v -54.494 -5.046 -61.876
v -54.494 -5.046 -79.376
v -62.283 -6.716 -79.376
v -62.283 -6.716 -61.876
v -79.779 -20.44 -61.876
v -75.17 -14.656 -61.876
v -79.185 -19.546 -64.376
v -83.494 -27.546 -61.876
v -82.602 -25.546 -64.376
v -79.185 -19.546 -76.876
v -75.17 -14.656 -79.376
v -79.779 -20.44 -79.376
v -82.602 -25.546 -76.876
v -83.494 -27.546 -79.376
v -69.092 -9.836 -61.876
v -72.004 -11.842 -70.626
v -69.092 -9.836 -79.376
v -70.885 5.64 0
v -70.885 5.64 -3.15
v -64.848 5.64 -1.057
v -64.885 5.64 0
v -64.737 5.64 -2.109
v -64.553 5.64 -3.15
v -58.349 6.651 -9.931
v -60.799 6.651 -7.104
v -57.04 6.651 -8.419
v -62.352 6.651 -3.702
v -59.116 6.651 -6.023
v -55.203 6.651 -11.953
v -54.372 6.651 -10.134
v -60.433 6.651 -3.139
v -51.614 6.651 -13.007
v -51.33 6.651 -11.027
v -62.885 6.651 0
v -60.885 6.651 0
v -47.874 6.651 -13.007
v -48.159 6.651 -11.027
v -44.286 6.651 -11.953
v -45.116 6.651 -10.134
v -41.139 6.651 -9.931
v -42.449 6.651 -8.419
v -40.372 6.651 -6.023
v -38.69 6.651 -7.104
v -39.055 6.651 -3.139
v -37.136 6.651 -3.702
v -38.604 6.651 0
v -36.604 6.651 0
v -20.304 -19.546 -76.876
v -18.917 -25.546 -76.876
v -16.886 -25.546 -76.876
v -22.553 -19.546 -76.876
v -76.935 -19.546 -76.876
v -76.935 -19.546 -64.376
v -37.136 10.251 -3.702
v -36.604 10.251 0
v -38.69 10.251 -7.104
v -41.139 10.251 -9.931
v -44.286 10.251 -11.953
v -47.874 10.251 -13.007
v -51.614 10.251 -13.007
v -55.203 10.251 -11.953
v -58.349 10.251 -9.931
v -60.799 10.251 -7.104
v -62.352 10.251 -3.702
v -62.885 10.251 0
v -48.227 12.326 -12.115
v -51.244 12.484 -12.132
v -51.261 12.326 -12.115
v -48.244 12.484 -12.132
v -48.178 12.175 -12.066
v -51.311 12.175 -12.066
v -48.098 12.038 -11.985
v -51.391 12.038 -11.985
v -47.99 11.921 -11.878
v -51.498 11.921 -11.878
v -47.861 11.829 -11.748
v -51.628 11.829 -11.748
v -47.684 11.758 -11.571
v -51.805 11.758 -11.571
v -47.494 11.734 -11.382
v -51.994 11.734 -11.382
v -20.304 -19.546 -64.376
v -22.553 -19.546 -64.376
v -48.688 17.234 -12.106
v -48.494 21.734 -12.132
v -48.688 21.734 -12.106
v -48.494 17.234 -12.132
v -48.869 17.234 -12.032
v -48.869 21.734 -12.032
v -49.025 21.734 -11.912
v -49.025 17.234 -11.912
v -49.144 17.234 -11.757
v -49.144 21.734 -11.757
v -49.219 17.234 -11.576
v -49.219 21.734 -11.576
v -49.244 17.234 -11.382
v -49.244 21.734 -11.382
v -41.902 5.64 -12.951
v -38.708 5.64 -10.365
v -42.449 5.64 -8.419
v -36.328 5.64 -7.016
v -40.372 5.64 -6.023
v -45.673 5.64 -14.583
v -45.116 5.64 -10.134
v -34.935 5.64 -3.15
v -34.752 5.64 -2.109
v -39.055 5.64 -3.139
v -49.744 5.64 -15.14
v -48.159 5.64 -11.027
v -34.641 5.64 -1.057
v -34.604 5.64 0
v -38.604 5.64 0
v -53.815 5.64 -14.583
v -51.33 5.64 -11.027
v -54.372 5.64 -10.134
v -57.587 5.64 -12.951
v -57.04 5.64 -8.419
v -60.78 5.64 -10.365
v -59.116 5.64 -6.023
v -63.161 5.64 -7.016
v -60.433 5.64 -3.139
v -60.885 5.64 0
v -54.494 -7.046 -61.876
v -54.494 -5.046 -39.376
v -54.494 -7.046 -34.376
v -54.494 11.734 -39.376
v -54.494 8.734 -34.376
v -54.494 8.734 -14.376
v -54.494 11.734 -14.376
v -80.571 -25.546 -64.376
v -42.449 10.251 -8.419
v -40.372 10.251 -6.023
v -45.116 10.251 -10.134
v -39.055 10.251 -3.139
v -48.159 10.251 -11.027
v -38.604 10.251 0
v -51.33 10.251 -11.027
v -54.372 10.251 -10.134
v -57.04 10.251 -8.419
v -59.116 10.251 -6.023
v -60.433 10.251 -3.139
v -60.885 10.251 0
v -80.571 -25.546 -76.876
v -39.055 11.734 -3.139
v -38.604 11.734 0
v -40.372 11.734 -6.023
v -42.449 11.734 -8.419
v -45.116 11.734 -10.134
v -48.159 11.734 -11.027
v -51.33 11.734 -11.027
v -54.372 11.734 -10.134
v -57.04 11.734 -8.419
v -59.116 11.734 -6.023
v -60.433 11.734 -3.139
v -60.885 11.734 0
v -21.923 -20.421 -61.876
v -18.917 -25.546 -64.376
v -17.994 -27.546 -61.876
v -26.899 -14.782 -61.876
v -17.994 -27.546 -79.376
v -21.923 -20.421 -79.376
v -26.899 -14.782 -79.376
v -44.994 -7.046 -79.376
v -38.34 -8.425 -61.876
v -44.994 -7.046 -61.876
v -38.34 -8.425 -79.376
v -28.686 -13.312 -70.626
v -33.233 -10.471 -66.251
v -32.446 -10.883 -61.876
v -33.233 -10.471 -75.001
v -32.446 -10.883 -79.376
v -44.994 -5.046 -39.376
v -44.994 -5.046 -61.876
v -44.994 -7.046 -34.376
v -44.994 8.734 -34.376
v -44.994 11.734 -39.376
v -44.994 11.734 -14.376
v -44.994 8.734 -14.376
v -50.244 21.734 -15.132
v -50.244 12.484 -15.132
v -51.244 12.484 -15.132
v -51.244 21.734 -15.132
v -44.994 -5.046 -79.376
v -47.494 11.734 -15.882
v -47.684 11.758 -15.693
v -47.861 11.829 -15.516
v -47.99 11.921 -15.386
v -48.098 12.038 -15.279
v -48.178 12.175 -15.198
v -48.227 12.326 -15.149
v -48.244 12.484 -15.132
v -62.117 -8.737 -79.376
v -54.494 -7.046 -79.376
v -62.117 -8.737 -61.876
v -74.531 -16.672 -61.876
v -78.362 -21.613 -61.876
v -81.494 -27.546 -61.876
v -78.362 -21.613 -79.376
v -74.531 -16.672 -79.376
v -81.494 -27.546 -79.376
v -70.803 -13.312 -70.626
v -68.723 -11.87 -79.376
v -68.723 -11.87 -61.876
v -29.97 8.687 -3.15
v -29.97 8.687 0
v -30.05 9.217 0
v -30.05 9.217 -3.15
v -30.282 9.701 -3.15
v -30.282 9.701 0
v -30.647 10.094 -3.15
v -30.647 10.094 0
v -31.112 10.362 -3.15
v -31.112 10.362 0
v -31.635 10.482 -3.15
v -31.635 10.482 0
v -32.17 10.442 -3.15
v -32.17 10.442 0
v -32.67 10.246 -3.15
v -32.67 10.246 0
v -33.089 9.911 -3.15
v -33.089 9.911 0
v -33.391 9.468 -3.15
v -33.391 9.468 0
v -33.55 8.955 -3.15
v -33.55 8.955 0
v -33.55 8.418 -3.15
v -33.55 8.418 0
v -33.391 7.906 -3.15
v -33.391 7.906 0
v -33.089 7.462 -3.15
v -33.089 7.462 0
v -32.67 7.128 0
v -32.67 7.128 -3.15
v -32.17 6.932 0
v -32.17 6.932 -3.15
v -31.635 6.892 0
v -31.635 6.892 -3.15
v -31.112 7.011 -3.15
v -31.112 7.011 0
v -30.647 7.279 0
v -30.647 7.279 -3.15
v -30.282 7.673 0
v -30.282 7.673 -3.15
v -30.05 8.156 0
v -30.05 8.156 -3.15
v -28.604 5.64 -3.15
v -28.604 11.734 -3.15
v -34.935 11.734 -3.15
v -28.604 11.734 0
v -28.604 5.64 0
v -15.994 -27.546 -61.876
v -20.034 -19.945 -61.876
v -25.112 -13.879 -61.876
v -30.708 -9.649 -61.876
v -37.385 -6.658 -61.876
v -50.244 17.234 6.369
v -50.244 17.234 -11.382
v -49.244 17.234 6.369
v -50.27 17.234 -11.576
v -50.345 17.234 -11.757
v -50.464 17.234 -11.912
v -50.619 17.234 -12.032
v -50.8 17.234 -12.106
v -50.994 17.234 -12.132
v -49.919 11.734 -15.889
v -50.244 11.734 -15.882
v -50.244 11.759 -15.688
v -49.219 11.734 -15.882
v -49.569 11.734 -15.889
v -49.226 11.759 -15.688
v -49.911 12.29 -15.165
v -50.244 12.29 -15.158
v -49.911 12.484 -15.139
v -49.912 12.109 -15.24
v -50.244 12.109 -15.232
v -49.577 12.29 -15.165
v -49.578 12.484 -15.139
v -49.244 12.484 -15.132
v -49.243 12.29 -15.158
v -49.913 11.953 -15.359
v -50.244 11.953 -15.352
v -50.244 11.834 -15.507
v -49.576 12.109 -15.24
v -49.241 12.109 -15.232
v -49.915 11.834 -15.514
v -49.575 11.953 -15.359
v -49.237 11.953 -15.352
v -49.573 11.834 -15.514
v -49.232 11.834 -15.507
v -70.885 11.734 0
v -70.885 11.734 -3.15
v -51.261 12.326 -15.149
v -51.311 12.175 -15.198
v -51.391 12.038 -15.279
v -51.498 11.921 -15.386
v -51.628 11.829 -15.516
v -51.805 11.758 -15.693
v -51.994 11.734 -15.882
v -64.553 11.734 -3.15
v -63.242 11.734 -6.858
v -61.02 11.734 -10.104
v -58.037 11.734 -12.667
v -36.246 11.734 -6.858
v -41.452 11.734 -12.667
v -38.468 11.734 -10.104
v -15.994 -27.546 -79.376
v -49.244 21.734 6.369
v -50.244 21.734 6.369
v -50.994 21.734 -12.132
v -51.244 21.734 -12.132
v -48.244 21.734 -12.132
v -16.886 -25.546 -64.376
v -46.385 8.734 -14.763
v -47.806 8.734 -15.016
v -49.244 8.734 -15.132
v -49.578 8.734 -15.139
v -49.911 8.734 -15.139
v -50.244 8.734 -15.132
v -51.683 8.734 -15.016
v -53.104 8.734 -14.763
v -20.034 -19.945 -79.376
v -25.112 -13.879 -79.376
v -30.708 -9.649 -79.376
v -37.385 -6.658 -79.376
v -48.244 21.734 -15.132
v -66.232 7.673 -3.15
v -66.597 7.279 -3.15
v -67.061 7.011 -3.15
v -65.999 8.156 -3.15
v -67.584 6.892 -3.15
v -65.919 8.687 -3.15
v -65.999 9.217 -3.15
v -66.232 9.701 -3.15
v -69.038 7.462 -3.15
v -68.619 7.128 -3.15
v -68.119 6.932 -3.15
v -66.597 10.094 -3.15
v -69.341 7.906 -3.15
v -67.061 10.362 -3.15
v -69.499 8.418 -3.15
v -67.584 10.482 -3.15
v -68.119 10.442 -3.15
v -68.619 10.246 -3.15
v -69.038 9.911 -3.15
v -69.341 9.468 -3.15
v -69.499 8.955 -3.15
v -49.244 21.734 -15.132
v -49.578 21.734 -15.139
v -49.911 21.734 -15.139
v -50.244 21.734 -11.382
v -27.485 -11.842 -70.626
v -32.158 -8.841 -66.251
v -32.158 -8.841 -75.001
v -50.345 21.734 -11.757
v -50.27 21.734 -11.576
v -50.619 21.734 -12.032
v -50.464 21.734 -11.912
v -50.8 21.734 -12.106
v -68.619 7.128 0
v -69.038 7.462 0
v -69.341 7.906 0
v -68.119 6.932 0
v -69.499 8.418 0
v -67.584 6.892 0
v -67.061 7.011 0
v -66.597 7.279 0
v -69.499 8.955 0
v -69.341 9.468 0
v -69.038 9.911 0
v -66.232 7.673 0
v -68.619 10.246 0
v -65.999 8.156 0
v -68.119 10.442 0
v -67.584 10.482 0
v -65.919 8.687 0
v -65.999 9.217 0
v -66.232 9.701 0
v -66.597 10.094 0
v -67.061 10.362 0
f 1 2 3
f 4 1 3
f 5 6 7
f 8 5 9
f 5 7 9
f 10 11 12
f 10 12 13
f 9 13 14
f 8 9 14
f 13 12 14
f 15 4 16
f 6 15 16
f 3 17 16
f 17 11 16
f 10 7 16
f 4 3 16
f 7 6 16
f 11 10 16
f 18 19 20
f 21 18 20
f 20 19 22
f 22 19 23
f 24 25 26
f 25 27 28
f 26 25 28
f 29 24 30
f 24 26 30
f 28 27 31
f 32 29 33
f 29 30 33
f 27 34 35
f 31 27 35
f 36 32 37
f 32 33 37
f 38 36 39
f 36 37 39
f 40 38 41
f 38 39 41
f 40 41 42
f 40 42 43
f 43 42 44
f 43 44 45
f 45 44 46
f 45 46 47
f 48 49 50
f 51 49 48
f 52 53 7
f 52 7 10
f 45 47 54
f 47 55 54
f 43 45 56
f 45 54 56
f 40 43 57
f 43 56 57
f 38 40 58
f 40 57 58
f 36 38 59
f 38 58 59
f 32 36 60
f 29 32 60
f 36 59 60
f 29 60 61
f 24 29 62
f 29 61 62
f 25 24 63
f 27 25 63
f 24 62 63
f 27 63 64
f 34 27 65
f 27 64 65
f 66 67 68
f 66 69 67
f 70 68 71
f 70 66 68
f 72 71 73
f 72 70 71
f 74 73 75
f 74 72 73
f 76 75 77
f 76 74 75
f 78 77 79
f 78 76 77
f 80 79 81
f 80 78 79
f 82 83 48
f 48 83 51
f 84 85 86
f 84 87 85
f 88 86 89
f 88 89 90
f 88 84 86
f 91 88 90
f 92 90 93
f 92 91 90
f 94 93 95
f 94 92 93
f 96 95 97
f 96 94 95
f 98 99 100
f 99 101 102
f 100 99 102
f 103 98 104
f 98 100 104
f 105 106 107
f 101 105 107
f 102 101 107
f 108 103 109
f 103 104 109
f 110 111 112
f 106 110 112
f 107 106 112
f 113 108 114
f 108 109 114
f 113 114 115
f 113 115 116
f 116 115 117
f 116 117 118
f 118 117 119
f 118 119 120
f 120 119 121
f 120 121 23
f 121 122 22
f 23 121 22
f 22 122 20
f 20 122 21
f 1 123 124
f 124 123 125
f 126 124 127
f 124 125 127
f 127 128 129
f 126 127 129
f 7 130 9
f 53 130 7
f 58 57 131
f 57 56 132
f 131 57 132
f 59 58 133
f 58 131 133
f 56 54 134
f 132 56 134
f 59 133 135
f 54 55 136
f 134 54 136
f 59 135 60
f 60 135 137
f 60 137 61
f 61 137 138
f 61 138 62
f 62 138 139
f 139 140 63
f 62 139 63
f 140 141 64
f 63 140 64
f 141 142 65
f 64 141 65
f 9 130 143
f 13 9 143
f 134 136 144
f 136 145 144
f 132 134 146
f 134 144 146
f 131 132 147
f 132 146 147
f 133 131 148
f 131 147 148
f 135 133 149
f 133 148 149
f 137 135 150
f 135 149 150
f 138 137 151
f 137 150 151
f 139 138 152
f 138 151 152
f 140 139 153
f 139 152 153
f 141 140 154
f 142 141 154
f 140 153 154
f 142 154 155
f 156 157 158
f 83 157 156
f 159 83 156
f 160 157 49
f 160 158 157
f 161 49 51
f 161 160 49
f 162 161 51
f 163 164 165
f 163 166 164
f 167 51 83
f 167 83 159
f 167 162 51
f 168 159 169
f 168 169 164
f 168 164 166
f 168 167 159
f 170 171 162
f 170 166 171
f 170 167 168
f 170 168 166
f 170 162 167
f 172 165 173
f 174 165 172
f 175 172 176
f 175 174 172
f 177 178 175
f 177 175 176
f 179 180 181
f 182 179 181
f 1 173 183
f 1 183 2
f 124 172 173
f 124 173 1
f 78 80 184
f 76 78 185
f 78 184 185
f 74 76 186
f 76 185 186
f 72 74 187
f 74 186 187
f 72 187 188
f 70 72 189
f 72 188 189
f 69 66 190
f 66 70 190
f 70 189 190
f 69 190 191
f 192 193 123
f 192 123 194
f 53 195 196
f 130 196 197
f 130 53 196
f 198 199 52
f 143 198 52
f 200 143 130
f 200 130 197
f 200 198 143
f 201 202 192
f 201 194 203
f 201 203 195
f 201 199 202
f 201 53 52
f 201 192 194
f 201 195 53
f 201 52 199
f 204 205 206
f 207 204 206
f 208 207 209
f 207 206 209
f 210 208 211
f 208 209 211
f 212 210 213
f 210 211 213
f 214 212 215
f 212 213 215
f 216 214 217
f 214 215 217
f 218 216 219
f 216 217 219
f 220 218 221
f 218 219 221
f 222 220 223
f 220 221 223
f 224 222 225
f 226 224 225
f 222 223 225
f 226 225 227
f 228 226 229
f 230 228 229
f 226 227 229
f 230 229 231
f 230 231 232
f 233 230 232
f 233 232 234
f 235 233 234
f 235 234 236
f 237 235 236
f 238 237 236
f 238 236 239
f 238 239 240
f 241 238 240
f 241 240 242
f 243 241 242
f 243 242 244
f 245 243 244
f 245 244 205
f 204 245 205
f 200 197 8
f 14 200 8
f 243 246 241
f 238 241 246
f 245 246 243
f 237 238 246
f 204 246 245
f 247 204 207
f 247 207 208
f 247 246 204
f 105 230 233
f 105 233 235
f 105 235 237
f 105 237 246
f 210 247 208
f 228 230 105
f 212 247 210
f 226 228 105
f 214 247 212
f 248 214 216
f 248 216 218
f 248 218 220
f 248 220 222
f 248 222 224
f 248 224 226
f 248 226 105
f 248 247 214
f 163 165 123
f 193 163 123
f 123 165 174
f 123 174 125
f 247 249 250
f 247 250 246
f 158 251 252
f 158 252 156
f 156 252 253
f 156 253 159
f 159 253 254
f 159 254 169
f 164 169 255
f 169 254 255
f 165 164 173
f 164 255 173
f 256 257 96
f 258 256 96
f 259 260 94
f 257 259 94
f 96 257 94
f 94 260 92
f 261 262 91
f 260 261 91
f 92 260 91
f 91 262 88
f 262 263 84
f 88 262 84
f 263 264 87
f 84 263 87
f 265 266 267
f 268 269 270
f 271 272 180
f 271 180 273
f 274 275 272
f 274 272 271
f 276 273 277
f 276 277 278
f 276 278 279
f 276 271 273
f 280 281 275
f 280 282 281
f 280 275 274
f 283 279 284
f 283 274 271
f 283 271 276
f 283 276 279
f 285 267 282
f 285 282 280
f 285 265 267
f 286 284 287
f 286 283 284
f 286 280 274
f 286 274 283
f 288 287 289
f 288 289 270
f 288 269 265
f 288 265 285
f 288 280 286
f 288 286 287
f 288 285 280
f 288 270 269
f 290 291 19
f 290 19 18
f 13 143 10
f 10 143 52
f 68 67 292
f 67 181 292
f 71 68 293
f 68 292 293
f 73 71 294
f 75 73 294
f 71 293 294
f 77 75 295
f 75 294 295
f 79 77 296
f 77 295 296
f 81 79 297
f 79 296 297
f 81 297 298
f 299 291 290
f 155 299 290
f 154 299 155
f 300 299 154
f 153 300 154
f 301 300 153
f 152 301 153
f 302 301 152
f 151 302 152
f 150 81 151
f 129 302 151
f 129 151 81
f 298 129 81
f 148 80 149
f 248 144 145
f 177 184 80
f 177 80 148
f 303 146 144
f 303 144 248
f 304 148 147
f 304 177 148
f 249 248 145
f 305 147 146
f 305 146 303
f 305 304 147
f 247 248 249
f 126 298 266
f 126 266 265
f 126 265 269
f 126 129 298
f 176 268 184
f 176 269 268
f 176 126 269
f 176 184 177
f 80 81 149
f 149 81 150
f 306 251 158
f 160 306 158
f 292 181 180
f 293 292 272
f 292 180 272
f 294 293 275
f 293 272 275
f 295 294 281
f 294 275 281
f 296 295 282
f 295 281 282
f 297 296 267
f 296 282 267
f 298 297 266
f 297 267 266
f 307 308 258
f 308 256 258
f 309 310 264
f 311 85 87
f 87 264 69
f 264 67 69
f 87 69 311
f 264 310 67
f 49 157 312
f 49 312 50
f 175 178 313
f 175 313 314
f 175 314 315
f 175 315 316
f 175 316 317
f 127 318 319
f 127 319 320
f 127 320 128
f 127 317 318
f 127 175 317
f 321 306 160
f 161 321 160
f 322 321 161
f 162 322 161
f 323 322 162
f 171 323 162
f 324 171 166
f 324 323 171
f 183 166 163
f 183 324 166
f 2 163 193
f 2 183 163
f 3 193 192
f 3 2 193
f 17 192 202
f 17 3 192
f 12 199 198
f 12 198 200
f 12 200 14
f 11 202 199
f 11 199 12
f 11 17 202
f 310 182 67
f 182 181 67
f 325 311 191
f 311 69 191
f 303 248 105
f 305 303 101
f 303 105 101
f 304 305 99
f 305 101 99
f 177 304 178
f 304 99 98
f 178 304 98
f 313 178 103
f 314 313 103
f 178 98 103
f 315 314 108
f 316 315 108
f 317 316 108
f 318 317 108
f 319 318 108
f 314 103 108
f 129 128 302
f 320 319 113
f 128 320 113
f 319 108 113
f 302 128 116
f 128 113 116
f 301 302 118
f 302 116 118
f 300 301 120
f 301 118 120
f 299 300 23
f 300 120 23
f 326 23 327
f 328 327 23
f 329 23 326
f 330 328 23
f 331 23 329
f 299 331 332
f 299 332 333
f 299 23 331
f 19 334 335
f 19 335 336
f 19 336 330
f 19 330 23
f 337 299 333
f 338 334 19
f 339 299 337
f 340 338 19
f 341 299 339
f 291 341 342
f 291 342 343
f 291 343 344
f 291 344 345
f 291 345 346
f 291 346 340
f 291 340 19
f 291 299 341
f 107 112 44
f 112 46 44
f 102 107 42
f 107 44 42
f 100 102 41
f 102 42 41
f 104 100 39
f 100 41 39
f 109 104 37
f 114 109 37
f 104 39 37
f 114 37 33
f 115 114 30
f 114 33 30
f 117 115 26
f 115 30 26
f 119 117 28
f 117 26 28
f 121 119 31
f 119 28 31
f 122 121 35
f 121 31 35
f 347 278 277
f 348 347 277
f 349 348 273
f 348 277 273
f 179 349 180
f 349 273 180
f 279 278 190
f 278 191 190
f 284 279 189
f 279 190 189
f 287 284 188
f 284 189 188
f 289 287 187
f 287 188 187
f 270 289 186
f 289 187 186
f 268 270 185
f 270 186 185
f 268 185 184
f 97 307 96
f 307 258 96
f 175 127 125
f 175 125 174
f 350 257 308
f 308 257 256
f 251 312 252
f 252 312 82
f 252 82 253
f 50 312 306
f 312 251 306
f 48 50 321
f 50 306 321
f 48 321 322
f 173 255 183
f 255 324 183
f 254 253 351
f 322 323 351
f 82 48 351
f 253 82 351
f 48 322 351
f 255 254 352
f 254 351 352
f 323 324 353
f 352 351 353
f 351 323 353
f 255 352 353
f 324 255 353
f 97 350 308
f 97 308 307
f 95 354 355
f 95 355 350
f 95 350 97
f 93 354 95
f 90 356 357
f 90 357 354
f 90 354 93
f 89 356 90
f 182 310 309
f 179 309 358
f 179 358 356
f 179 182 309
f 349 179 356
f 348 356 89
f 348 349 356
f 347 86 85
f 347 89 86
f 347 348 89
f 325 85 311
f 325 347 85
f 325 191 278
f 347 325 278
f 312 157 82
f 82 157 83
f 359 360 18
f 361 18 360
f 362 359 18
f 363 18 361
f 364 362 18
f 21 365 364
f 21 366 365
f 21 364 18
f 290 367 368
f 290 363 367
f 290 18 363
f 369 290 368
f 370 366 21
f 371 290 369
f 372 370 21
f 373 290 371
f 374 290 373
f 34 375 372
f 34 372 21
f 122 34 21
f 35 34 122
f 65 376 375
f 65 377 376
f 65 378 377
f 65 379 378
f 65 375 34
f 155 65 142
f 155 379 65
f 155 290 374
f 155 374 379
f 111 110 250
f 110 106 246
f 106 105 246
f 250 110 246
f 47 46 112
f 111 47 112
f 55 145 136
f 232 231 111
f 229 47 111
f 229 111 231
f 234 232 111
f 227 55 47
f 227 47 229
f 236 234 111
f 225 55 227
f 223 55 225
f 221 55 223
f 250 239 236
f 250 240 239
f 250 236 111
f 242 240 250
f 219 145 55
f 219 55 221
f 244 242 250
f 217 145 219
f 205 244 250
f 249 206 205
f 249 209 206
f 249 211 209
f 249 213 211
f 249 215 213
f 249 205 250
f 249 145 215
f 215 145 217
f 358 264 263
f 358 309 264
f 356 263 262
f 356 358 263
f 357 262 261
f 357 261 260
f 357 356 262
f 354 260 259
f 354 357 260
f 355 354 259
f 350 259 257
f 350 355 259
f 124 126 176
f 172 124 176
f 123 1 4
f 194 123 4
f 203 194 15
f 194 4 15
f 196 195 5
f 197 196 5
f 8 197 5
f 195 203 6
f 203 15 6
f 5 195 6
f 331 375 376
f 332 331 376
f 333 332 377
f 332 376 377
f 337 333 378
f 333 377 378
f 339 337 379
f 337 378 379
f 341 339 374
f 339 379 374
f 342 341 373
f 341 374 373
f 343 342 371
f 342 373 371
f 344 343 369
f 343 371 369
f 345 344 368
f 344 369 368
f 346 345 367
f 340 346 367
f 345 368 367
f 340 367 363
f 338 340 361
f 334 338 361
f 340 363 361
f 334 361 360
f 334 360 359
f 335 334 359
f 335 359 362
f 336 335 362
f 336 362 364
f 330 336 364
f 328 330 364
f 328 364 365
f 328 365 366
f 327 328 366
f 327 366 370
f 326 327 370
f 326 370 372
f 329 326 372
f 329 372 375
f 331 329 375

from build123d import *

# Parameters (mm, degrees)
BOSS_EXTRUDE1_DEPTH     = 8.5
BOSS_EXTRUDE2_DEPTH     = 3
BOSS_EXTRUDE3_DEPTH     = 3
SKETCH10_W              = 9.5
SKETCH10_H              = 5
BOSS_EXTRUDE4_DEPTH     = 15.78
SKETCH11_W              = 9.5
SKETCH11_H              = 2
BOSS_EXTRUDE5_DEPTH     = 40
BOSS_EXTRUDE6_DEPTH     = 6.09393
SKETCH14_R              = 1.8
CUT_EXTRUDE1_DEPTH      = 6.3
SKETCH15_W              = 51.153217575
SKETCH15_H              = 21.210560201
CUT_EXTRUDE3_DEPTH      = 19.78
SKETCH18_W              = 3
SKETCH18_H              = 3
BOSS_EXTRUDE7_DEPTH     = 8.5
FILLET1_R               = 0.75
BOSS_EXTRUDE8_DEPTH     = 1.5
FILLET2_R               = 0.75
BOSS_EXTRUDE9_DEPTH     = 17.5
SKETCH21_W              = 12.5
SKETCH21_H              = 6
CUT_EXTRUDE4_DEPTH      = 30.0000001
CUT_EXTRUDE4_DEPTH_BACK = 39.5000001


with BuildPart() as part:
    # Sketch3 → Revolve1 (revolve)
    with BuildSketch(Plane.XY):
        Polygon((-62.694264441, 11.733728816), (-64.884531744, 11.733728816), (-64.884531744, 5.639799249), (-60.884531744, 5.639799249), (-60.884531744, 6.650679103), (-62.884531744, 6.650679103), (-62.884531744, 10.250679103), (-60.884531744, 10.250679103), (-60.884531744, 11.733728816), align=None)
    revolve(axis=Axis((-49.744264441, 0, 0), (0, 1, 0)))

    # Sketch7 → Boss-Extrude1 (add)
    with BuildSketch(Plane(origin=(0, 11.733728816, 0), x_dir=(1, 0, 0), z_dir=(0, 1, 0))):
        with BuildLine():
            Line((-50.244264441, 15.132008921), (-50.244264441, 13.130751112))
            ThreePointArc((-50.244264441, 13.130751112), (-49.744264441, 13.140267302), (-49.244264441, 13.130751112))
            Line((-49.244264441, 13.130751112), (-49.244264441, 15.132008921))
            ThreePointArc((-49.244264441, 15.132008921), (-49.744264441, 15.140267302), (-50.244264441, 15.132008921))
        make_face()
    extrude(amount=BOSS_EXTRUDE1_DEPTH)

    # Sketch8 → Boss-Extrude2 (add)
    with BuildSketch(Plane(origin=(0, 20.233728816, 0), x_dir=(1, 0, 0), z_dir=(0, 1, 0))):
        with BuildLine():
            Line((-50.244264441, 15.132008921), (-50.244264441, 13.130751112))
            Line((-50.244264441, 13.130751112), (-50.244264441, -6.369248888))
            Line((-50.244264441, -6.369248888), (-49.244264441, -6.369248888))
            Line((-49.244264441, -6.369248888), (-49.244264441, 13.130751112))
            Line((-49.244264441, 13.130751112), (-49.244264441, 15.132008921))
            ThreePointArc((-49.244264441, 15.132008921), (-49.744264441, 15.140267302), (-50.244264441, 15.132008921))
        make_face()
    extrude(amount=-BOSS_EXTRUDE2_DEPTH)

    # Sketch9 → Boss-Extrude3 (add)
    with BuildSketch(Plane(origin=(0, 11.733728816, 0), x_dir=(1, 0, 0), z_dir=(0, 1, 0))):
        with BuildLine():
            Line((-54.494264441, 14.375854548), (-54.494264441, 39.375854548))
            Line((-54.494264441, 39.375854548), (-44.994264441, 39.375854548))
            Line((-44.994264441, 39.375854548), (-44.994264441, 14.375854548))
            ThreePointArc((-44.994264441, 14.375854548), (-47.092177082, 14.906177465), (-49.244264441, 15.132008921))
            ThreePointArc((-49.244264441, 15.132008921), (-49.744264441, 15.140267302), (-50.244264441, 15.132008921))
            ThreePointArc((-50.244264441, 15.132008921), (-52.3963518, 14.906177465), (-54.494264441, 14.375854548))
        make_face()
    extrude(amount=-BOSS_EXTRUDE3_DEPTH)

    # Sketch10 → Boss-Extrude4 (add)
    with BuildSketch(Plane.XZ.offset(-8.733728816)):
        with Locations((-49.744264441, -36.875854548)):
            Rectangle(SKETCH10_W, SKETCH10_H)
    extrude(amount=BOSS_EXTRUDE4_DEPTH)

    # Sketch11 → Boss-Extrude5 (add)
    with BuildSketch(Plane(origin=(0, 0, -39.375854548), x_dir=(-1, 0, 0), z_dir=(0, 0, -1))):
        with Locations((49.744264441, -6.046271184)):
            Rectangle(SKETCH11_W, SKETCH11_H)
    extrude(amount=BOSS_EXTRUDE5_DEPTH)

    # Sketch13 → Boss-Extrude6 (add)
    with BuildSketch(Plane(origin=(0, 11.733728816, 0), x_dir=(1, 0, 0), z_dir=(0, 1, 0))):
        with BuildLine():
            Line((-28.603997139, 3.15), (-34.935307895, 3.15))
            ThreePointArc((-34.935307895, 3.15), (-34.603997139, 0), (-34.935307895, -3.15))
            Line((-34.935307895, -3.15), (-28.603997139, -3.15))
            Line((-28.603997139, -3.15), (-28.603997139, 3.15))
        make_face()
        with BuildLine():
            Line((-70.884531744, 3.15), (-70.884531744, -3.15))
            Line((-70.884531744, -3.15), (-64.553220987, -3.15))
            ThreePointArc((-64.553220987, -3.15), (-64.884531744, 0), (-64.553220987, 3.15))
            Line((-64.553220987, 3.15), (-70.884531744, 3.15))
        make_face()
    extrude(amount=-BOSS_EXTRUDE6_DEPTH)

    # Sketch14 → Cut-Extrude1 (cut)
    with BuildSketch(Plane.XY.offset(3.15)):
        with Locations((-31.769652517, 8.686764033)):
            Circle(SKETCH14_R)
        with Locations((-67.718876365, 8.686764033)):
            Circle(SKETCH14_R)
    extrude(amount=-CUT_EXTRUDE1_DEPTH, mode=Mode.SUBTRACT)

    # Sketch15 → Cut-Extrude3 (cut, through all)
    with BuildSketch(Plane(origin=(0, 11.733728816, 0), x_dir=(1, 0, 0), z_dir=(0, 1, 0))):
        with Locations((-49.018725857, -10.6052801)):
            Rectangle(SKETCH15_W, SKETCH15_H)
    extrude(amount=-CUT_EXTRUDE3_DEPTH, mode=Mode.SUBTRACT)

    # Sketch18 → Boss-Extrude7 (add)
    with BuildSketch(Plane(origin=(0, 11.733728816, 0), x_dir=(1, 0, 0), z_dir=(0, 1, 0))):
        with Locations((-49.744264441, 13.632008921)):
            Rectangle(SKETCH18_W, SKETCH18_H)
    extrude(amount=BOSS_EXTRUDE7_DEPTH)

    # Fillet1
    fillet1_edges = [part.edges().sort_by_distance(p)[0] for p in [
        (-50.744264441, 11.733728816, -15.132008921),
        (-48.744264441, 11.733728816, -15.132008921),
        (-49.744264441, 11.733728816, -12.132008921),
        (-48.244264441, 11.733728816, -13.632008921),
        (-51.244264441, 11.733728816, -13.632008921),
        (-49.744264441, 11.733728816, -15.140267302),
    ]]
    fillet(fillet1_edges, radius=FILLET1_R)

    # Sketch19 → Boss-Extrude8 (add)
    with BuildSketch(Plane(origin=(0, 20.233728816, 0), x_dir=(1, 0, 0), z_dir=(0, 1, 0))):
        with BuildLine():
            Line((-50.244264441, 15.132008921), (-51.244264441, 15.132008921))
            Line((-51.244264441, 15.132008921), (-51.244264441, 12.132008921))
            Line((-51.244264441, 12.132008921), (-50.244264441, 12.132008921))
            Line((-50.244264441, 12.132008921), (-50.244264441, -6.369248888))
            Line((-50.244264441, -6.369248888), (-49.244264441, -6.369248888))
            Line((-49.244264441, -6.369248888), (-49.244264441, 12.132008921))
            Line((-49.244264441, 12.132008921), (-48.244264441, 12.132008921))
            Line((-48.244264441, 12.132008921), (-48.244264441, 15.132008921))
            Line((-48.244264441, 15.132008921), (-49.244264441, 15.132008921))
            ThreePointArc((-49.244264441, 15.132008921), (-49.744264441, 15.140267302), (-50.244264441, 15.132008921))
        make_face()
    extrude(amount=BOSS_EXTRUDE8_DEPTH)

    # Fillet2
    fillet2_edges = [part.edges().sort_by_distance(p)[0] for p in [
        (-50.244264441, 19.483728816, -12.132008921),
        (-49.244264441, 19.483728816, -12.132008921),
    ]]
    fillet(fillet2_edges, radius=FILLET2_R)

    # Sketch20 → Boss-Extrude9 (add)
    with BuildSketch(Plane(origin=(0, 0, -79.375854548), x_dir=(-1, 0, 0), z_dir=(0, 0, -1))):
        with BuildLine():
            Line((15.994264441, -27.546271184), (17.994264441, -27.546271184))
            add(Edge.make_bspline(
                [(17.994264441, -27.546271184), (25.87775722, -9.327062953), (44.994264441, -7.046271184)],
                knots=[0, 0, 0, 0.444959485, 0.444959485, 0.444959485], degree=2))
            Line((44.994264441, -7.046271184), (54.494264441, -7.046271184))
            add(Edge.make_bspline(
                [(54.494264441, -7.046271184), (73.610771663, -9.327062953), (81.494264441, -27.546271184)],
                knots=[0.555040515, 0.555040515, 0.555040515, 1, 1, 1], degree=2))
            Line((81.494264441, -27.546271184), (83.494264441, -27.546271184))
            add(Edge.make_bspline(
                [(54.494264441, -5.046271184), (75.013161261, -7.38841158), (83.494264441, -27.546271184)],
                knots=[0.551684944, 0.551684944, 0.551684944, 1, 1, 1], degree=2))
            Line((54.494264441, -5.046271184), (44.994264441, -5.046271184))
            add(Edge.make_bspline(
                [(15.994264441, -27.546271184), (24.475367621, -7.38841158), (44.994264441, -5.046271184)],
                knots=[0, 0, 0, 0.448315056, 0.448315056, 0.448315056], degree=2))
        make_face()
    extrude(amount=-BOSS_EXTRUDE9_DEPTH)

    # Sketch21 → Cut-Extrude4 (cut, two sides)
    with BuildSketch(Plane(origin=(-44.994264441, 0, 0), x_dir=(0, 0, -1), z_dir=(1, 0, 0))) as cut_extrude4_sk:
        with Locations((70.625854548, -22.546271184)):
            Rectangle(SKETCH21_W, SKETCH21_H)
    extrude(amount=CUT_EXTRUDE4_DEPTH, mode=Mode.SUBTRACT)
    extrude(cut_extrude4_sk.sketch, amount=-CUT_EXTRUDE4_DEPTH_BACK, mode=Mode.SUBTRACT)


solid = part.part
